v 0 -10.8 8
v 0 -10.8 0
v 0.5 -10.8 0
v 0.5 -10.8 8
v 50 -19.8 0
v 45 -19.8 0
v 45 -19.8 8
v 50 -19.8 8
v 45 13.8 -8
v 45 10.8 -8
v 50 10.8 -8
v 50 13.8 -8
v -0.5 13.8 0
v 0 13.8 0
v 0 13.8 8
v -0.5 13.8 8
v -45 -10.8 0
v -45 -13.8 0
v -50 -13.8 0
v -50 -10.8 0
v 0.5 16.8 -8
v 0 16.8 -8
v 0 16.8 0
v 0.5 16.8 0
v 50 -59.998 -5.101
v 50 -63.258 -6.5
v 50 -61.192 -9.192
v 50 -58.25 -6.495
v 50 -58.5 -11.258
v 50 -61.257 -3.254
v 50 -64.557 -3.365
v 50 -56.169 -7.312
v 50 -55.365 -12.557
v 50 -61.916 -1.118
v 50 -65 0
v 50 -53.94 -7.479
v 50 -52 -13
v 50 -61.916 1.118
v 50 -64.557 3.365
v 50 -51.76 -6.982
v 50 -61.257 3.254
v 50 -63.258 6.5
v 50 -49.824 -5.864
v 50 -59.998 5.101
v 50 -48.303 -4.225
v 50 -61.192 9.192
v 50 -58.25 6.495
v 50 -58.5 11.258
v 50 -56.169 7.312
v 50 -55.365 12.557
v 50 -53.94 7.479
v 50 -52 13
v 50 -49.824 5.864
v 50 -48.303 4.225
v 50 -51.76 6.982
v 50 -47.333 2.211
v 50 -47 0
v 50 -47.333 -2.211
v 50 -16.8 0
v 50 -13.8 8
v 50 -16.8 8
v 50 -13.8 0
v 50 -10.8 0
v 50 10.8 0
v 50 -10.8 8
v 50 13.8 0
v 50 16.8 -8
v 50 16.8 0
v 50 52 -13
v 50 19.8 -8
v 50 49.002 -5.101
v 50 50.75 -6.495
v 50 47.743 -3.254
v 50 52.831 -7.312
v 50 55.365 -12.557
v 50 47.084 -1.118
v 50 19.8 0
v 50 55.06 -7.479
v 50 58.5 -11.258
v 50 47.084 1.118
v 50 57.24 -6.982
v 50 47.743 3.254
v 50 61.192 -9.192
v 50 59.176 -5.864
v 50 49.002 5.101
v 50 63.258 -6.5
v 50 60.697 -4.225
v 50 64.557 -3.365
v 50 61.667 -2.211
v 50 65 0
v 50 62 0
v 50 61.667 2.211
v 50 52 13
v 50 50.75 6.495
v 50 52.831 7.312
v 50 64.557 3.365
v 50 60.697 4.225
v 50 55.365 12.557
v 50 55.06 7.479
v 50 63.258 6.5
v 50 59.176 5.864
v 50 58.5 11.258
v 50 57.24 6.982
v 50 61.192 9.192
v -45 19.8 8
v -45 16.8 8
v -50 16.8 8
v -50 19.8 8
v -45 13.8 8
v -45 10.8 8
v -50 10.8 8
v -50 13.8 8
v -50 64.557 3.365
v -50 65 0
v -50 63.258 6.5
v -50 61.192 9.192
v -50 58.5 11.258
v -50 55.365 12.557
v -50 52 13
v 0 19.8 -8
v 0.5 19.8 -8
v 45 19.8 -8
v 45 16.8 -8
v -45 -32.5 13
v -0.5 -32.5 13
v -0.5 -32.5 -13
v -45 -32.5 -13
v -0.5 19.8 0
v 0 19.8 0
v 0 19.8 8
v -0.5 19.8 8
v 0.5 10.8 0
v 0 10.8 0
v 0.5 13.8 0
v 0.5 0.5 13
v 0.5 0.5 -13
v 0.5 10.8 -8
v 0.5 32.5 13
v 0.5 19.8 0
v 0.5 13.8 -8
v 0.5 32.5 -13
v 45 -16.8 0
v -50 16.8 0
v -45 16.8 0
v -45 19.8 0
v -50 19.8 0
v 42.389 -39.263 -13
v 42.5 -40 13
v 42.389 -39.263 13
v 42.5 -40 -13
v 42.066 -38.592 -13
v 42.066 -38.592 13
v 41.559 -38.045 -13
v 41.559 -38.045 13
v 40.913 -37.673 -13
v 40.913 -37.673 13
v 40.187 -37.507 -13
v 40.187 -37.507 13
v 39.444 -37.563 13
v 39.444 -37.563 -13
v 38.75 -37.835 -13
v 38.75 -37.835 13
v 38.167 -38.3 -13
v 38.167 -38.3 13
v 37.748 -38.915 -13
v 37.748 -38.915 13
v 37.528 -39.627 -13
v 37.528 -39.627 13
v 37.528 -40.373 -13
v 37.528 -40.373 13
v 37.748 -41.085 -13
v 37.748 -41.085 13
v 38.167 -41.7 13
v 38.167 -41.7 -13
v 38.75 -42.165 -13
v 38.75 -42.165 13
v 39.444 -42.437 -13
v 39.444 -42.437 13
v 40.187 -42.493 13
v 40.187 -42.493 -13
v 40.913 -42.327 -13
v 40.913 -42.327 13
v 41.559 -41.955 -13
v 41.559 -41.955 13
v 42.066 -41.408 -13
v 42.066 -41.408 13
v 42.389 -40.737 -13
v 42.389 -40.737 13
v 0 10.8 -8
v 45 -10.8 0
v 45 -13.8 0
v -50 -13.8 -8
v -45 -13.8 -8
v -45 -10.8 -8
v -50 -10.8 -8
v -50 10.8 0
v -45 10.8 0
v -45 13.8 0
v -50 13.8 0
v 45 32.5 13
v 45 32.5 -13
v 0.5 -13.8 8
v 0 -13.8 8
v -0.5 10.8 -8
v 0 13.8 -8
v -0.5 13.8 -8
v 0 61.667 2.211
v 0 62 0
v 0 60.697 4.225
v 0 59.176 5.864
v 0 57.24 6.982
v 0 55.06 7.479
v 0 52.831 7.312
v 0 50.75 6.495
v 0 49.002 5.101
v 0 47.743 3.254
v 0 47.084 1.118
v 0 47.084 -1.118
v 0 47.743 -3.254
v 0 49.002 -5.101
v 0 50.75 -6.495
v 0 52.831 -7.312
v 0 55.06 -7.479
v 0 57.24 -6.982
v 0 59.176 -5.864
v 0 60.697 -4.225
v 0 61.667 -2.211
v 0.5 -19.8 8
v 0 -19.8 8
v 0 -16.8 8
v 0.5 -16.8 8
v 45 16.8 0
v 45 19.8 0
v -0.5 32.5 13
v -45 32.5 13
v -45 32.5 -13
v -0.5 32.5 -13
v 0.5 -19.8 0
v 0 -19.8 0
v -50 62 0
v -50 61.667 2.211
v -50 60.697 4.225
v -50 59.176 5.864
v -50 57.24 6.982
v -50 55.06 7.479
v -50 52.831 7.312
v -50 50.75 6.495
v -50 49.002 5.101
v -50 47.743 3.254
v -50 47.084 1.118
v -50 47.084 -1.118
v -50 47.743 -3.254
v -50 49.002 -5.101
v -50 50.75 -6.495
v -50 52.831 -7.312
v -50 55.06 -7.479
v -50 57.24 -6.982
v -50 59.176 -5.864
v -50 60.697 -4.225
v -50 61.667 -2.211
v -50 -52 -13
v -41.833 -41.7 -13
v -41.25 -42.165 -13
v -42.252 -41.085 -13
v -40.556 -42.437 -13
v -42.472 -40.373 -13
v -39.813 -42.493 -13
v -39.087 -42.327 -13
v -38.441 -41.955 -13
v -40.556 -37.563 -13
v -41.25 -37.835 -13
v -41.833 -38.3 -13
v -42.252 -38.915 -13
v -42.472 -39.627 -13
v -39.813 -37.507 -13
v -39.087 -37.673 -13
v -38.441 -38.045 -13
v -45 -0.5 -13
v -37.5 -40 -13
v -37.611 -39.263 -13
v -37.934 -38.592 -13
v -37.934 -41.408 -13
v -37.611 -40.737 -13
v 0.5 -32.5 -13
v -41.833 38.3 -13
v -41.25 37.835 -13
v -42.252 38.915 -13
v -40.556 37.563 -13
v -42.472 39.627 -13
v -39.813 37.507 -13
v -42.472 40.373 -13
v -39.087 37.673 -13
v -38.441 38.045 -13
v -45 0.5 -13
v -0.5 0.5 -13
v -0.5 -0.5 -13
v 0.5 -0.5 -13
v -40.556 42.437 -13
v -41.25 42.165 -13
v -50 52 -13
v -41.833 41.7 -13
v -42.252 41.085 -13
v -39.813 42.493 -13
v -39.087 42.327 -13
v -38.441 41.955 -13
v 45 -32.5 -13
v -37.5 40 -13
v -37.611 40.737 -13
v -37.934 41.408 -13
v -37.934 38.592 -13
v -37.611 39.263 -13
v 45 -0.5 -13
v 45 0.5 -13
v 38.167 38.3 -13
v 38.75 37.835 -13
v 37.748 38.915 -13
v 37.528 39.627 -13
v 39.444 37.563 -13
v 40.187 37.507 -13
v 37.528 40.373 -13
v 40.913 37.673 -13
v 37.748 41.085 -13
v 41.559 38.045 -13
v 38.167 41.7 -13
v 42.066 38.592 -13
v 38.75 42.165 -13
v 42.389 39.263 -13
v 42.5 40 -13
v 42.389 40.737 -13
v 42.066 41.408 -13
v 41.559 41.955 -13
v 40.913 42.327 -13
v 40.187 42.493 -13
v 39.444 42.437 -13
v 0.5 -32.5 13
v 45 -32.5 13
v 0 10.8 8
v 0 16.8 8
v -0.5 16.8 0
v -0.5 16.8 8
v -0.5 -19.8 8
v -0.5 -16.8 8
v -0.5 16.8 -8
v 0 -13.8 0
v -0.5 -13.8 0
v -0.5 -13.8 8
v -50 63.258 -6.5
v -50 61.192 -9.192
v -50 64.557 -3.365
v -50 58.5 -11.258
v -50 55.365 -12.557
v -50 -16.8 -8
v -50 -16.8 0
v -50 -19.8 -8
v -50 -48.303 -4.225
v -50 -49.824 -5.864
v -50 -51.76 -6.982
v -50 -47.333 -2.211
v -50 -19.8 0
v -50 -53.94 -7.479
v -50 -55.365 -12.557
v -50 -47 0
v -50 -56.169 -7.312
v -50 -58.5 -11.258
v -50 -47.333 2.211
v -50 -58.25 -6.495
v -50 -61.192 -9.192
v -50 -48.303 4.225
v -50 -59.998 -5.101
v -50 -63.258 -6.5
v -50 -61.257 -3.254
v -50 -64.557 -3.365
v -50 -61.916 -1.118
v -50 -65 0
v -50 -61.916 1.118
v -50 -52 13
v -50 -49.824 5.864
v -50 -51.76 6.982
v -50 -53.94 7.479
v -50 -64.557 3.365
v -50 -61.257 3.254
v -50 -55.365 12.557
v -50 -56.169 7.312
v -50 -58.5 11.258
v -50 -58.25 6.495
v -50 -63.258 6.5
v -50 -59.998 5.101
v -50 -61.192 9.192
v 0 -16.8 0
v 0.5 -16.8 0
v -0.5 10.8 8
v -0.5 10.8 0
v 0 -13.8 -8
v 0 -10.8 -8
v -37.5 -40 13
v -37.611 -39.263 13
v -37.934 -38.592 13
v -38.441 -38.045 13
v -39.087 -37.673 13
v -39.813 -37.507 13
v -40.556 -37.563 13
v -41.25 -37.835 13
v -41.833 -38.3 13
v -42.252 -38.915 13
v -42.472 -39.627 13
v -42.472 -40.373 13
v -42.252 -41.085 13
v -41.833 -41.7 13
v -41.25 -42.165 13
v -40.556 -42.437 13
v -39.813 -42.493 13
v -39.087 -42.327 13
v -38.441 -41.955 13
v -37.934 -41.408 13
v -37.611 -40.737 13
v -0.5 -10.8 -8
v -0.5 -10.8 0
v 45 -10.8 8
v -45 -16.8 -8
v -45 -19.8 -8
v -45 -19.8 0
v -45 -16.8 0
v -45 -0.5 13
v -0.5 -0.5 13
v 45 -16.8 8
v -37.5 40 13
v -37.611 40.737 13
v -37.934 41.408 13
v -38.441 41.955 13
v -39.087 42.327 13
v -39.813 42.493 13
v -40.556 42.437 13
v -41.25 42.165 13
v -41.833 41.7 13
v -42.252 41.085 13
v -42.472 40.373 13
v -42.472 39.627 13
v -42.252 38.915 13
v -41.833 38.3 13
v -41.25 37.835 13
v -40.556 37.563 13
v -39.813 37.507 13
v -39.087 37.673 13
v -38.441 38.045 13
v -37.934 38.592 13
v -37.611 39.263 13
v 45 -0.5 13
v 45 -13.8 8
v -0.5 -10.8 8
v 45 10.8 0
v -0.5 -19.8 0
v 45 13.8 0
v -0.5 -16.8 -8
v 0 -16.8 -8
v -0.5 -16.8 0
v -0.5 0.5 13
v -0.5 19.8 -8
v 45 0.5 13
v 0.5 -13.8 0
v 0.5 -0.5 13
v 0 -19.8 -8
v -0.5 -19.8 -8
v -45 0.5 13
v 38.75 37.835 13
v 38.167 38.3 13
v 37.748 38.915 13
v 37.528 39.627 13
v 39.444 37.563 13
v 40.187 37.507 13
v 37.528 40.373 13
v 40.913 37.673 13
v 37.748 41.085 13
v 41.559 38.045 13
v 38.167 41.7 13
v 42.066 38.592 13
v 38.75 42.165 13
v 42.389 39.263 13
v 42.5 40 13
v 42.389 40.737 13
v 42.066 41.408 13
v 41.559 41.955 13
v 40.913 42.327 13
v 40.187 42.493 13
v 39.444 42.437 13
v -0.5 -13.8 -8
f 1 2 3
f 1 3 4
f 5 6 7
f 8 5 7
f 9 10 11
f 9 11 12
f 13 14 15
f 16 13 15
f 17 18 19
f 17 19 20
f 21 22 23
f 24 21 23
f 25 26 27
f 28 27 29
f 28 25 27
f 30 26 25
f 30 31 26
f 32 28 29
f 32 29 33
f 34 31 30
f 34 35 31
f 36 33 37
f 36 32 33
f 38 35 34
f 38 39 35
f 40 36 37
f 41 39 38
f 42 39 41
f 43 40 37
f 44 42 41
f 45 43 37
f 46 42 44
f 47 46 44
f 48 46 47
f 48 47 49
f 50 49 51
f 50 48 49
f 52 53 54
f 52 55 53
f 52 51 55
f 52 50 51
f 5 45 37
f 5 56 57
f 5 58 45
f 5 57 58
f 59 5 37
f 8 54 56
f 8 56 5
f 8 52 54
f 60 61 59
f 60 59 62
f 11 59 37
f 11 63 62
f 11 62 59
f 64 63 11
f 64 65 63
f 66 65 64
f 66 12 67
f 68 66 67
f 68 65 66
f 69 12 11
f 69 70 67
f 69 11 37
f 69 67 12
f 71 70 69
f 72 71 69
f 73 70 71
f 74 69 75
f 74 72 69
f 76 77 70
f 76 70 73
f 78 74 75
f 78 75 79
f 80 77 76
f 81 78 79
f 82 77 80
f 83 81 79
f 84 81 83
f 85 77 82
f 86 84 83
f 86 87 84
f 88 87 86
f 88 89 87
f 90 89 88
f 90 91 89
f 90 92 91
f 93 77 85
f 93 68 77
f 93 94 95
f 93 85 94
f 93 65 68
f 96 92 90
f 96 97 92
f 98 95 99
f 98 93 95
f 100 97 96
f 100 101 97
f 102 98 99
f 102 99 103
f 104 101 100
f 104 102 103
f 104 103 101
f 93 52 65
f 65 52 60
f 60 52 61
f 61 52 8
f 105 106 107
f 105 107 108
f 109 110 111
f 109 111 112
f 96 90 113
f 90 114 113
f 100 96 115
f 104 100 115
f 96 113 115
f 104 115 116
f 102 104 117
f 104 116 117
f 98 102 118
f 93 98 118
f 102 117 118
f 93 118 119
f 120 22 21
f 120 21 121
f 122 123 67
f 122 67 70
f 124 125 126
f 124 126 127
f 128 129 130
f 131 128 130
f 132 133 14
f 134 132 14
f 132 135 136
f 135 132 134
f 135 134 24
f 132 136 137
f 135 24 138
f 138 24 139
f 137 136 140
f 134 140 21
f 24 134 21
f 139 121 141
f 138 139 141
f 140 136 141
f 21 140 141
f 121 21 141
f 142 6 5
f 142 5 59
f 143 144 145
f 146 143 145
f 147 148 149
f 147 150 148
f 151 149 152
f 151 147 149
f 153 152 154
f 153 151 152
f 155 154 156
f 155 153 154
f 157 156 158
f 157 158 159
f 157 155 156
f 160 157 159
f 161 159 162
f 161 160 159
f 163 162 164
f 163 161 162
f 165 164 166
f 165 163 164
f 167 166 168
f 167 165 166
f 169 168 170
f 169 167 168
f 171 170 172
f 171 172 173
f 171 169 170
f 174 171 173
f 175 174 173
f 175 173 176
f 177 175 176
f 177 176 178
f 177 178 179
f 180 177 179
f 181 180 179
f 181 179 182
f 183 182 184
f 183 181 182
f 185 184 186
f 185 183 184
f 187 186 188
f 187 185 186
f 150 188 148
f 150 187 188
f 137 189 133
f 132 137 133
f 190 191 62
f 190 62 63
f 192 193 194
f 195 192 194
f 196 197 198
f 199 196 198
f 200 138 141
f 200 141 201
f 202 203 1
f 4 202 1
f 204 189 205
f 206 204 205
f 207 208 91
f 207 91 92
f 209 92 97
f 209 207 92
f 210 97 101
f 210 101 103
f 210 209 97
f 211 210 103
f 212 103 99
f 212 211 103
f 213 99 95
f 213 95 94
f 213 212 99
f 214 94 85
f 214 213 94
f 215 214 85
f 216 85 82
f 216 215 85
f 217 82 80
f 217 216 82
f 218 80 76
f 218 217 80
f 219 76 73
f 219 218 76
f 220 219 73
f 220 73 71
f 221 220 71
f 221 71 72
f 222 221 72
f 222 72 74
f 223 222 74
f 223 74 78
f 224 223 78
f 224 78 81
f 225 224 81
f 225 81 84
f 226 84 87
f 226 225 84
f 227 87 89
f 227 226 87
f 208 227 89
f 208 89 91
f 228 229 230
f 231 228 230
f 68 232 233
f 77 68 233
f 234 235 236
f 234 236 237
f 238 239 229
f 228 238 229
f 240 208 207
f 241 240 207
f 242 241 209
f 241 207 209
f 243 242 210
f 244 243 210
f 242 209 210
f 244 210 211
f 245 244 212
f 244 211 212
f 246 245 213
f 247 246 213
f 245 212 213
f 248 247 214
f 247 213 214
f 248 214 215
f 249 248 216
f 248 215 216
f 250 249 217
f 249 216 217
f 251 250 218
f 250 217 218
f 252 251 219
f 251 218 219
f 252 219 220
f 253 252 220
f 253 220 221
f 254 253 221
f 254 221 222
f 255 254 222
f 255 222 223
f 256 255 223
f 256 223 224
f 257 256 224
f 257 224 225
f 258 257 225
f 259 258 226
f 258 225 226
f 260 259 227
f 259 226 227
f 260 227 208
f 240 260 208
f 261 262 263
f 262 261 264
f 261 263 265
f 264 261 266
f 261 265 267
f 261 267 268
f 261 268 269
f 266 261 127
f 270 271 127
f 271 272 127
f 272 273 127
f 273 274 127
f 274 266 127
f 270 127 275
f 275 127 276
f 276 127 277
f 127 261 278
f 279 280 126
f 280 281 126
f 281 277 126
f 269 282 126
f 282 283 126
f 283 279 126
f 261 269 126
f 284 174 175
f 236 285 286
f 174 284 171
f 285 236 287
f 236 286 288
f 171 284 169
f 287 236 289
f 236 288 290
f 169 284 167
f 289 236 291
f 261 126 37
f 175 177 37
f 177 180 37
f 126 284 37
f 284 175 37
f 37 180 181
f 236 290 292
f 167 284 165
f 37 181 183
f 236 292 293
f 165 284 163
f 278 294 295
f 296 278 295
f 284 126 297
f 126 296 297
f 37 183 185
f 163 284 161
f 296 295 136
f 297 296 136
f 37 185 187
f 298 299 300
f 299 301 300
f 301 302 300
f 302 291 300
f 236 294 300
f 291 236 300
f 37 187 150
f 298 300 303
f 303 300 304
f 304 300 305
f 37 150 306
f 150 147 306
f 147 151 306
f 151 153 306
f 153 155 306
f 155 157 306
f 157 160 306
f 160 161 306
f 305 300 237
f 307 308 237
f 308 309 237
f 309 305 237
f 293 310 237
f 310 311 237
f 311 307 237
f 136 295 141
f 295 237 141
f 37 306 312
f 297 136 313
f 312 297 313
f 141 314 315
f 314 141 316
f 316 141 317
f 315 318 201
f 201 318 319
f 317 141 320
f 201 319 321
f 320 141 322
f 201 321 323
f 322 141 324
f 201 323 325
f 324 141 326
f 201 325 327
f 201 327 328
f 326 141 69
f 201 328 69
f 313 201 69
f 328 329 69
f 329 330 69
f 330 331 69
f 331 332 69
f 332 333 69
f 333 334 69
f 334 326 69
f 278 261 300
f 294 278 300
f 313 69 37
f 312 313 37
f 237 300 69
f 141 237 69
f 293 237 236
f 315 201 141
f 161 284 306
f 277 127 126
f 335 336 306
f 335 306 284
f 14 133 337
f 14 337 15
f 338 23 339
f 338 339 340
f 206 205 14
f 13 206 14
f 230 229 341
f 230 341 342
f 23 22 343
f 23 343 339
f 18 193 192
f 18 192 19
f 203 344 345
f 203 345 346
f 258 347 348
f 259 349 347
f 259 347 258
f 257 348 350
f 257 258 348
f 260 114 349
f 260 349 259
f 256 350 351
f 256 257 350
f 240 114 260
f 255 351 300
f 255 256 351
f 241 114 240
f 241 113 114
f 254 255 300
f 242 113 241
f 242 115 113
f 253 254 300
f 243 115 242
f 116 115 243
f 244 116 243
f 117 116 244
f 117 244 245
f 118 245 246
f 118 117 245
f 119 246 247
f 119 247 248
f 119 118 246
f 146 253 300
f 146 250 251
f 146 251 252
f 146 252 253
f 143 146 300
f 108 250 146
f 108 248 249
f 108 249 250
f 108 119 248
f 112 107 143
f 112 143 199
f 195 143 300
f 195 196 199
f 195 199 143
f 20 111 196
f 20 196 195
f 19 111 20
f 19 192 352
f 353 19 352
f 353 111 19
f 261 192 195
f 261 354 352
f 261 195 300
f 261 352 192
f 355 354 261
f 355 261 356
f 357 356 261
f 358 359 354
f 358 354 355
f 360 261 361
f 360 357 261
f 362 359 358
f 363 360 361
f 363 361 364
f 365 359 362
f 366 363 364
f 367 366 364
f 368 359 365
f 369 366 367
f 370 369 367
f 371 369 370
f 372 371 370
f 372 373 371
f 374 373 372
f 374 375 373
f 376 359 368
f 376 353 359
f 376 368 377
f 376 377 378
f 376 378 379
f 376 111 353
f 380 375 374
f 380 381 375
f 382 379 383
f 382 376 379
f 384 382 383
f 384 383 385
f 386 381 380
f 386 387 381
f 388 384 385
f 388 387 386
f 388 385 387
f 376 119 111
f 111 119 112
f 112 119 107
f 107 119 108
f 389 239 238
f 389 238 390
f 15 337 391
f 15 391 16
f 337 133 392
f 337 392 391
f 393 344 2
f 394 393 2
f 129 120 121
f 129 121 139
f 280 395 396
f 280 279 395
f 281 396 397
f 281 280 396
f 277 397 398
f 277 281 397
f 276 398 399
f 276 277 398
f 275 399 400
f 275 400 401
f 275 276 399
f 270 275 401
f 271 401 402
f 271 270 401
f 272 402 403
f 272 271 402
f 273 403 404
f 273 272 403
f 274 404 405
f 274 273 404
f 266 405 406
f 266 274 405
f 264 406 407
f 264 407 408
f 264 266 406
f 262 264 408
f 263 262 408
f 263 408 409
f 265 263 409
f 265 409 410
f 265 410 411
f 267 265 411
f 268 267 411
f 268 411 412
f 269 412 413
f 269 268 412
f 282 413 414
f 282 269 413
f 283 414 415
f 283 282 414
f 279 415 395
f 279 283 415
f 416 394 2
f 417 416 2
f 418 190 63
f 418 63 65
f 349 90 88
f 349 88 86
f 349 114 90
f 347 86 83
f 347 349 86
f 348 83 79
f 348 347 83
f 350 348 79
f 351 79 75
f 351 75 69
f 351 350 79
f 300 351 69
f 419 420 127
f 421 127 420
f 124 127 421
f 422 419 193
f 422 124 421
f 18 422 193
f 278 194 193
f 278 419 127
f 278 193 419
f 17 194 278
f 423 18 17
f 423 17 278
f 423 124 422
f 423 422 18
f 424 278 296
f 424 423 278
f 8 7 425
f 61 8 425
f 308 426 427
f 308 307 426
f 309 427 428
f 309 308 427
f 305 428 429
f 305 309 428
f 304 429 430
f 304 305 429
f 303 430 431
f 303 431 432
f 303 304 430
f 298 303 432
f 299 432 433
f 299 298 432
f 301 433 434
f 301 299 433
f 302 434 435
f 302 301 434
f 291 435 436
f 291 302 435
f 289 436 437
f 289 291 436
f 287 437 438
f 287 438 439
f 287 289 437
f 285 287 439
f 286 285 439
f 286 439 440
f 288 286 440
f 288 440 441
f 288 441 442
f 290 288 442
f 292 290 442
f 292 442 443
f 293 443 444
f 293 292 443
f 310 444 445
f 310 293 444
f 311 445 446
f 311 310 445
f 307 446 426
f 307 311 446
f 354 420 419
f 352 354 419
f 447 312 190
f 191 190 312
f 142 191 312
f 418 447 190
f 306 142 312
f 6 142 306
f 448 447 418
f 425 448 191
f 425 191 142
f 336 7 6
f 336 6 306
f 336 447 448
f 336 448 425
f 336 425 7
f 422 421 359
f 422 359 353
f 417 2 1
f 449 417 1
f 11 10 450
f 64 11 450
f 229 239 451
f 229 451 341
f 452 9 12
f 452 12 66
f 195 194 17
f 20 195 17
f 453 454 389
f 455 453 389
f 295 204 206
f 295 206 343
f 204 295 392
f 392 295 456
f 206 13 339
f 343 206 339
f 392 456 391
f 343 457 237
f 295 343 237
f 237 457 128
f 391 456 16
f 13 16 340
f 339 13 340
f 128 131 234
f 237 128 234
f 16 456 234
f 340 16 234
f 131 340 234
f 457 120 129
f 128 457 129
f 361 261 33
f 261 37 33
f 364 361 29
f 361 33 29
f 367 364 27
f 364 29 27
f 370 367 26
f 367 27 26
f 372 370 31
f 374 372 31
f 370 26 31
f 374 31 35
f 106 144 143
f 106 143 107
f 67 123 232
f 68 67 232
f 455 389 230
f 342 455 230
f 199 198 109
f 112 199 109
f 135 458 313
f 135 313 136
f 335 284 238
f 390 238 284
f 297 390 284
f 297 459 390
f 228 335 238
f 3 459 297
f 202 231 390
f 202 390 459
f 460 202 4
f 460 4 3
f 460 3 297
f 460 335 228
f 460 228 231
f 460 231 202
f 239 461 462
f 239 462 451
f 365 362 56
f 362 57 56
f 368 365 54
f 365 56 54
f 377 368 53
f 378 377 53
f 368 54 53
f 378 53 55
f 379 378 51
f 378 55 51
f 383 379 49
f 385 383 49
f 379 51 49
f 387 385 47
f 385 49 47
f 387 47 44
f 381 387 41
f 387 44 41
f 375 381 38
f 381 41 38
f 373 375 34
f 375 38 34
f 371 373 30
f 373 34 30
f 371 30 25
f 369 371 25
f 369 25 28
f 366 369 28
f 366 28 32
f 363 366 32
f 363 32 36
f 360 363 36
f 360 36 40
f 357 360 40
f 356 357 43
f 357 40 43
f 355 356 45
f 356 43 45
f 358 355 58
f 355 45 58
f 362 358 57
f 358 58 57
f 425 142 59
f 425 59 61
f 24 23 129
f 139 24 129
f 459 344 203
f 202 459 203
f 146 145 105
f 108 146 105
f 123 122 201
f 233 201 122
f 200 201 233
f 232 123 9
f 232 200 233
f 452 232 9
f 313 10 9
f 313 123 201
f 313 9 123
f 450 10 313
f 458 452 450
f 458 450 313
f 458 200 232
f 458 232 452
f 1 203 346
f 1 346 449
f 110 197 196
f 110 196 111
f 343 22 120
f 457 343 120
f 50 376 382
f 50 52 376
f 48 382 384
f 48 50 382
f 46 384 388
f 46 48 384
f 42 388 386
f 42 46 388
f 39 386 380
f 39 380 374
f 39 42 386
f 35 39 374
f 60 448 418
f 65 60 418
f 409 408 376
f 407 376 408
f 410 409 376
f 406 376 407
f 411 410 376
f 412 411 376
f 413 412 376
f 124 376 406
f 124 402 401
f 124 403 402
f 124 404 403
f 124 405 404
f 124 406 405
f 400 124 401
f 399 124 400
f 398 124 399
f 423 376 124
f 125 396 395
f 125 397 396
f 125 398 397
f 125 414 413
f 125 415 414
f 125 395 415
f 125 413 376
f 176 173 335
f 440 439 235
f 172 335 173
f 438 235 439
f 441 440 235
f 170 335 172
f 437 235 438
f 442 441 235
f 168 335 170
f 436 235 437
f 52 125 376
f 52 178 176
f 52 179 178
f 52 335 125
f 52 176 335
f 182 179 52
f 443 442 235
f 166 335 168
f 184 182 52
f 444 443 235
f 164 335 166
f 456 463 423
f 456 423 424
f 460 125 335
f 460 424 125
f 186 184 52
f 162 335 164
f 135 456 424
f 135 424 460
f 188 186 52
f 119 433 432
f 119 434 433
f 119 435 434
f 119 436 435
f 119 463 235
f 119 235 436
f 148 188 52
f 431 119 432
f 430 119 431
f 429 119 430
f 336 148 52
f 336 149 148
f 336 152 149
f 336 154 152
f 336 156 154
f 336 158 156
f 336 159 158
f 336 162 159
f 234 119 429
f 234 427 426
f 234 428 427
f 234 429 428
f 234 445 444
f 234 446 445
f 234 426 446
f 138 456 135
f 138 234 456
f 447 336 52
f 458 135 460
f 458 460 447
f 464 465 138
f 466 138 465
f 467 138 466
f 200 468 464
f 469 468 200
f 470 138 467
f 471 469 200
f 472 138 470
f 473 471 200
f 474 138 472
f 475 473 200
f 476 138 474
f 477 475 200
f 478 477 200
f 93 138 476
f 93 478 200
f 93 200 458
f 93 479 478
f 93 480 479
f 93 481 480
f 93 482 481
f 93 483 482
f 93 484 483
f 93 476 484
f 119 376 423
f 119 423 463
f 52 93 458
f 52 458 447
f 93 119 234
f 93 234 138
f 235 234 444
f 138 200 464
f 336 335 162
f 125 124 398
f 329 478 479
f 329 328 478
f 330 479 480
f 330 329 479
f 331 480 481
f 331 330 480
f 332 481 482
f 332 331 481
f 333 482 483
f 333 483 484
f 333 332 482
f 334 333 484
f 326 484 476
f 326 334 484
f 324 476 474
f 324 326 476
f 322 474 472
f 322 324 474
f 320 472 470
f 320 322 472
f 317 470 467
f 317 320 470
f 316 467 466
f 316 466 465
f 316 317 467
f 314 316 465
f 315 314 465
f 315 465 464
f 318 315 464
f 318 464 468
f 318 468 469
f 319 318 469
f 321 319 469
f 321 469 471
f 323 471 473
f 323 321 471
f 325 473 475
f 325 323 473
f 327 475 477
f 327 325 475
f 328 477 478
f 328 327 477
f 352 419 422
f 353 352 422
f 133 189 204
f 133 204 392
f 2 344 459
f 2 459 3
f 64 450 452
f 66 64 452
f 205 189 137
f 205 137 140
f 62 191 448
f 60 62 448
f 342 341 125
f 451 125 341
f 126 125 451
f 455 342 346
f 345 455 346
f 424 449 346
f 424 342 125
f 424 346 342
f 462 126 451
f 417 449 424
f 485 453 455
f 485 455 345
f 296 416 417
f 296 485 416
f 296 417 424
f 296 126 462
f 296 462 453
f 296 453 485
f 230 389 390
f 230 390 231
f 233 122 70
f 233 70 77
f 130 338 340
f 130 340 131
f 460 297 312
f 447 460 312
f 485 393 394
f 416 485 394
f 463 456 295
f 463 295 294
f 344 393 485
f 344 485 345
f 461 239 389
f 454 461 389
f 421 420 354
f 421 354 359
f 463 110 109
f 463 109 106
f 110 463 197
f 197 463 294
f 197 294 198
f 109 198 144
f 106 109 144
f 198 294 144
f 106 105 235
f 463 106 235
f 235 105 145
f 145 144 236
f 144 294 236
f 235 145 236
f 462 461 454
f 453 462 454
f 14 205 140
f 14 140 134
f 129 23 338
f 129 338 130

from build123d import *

# Parameters (mm, degrees)
F0_R          = 2.5
F0_W          = 44.5
F0_H          = 1
F0_W_2        = 1
F0_H_2        = 32
F1_DEPTH      = 13
F2_R          = 7.5
F3_DEPTH      = 50
F4_R          = 12.99999
F2_W          = 3
F2_H          = 8
F5_DEPTH      = 50
F6_DEPTH      = 50
F6_DEPTH_BACK = 25


# Not quite as in the source:
# - a fillet or chamfer is up to 0.001 mm smaller than in the source, because OpenCascade refuses the exact size
# - a feature names something its author has since deleted; it is built from what else it names


with BuildPart() as f1:
    # F0 (on Top) → F1 (new body, symmetric)
    with BuildSketch(Plane.XY):
        Polygon((50, 45), (50, 65), (-40, 65), (-50, 65), (-50, -45), (-40, -45), (50, -45), (50, -34.6913893335), (50, 40), align=None)
        with Locations((-40, -40)):
            Circle(F0_R, mode=Mode.SUBTRACT)
        with Locations((40, -40)):
            Circle(F0_R, mode=Mode.SUBTRACT)
        with Locations((-40, 40)):
            Circle(F0_R, mode=Mode.SUBTRACT)
        Polygon((0.5, 32.5), (45, 32.5), (45, 0.5), (45, -0.5), (45, -32.5), (0.5, -32.5), (-0.5, -32.5), (-45, -32.5), (-45, -0.5), (-45, 0.5), (-45, 32.5), (-0.5, 32.5), align=None, mode=Mode.SUBTRACT)
        with Locations((40, 40)):
            Circle(F0_R, mode=Mode.SUBTRACT)
        Polygon((-40, -45), (-50, -45), (-50, -65), (50, -65), (50, -45), align=None)
        with Locations((22.75, 0)):
            Rectangle(F0_W, F0_H)
        with Locations((-22.75, 0)):
            Rectangle(F0_W, F0_H)
        Rectangle(F0_W_2, F0_H)
        with Locations((0, -16.5)):
            Rectangle(F0_W_2, F0_H_2)
        with Locations((0, 16.5)):
            Rectangle(F0_W_2, F0_H_2)
    extrude(amount=F1_DEPTH, both=True)

    # F2 (on Right) → F3 (cut, symmetric)
    with BuildSketch(Plane.YZ):
        with Locations((54.5, 0)):
            Circle(F2_R)
        with Locations((-54.5, 0)):
            Circle(F2_R)
    extrude(amount=F3_DEPTH, both=True, mode=Mode.SUBTRACT)

    # F4 (radius 13 in the source; OpenCascade refuses exactly that, so slightly less here)
    f4_edges = [f1.edges().sort_by_distance(p)[0] for p in [
        (0, 65, 13),
        (0, 65, -13),
        (0, -65, 13),
        (0, -65, -13),
    ]]
    fillet(f4_edges, radius=F4_R)

    # F2 (on Right) → F5 (cut)
    with BuildSketch(Plane.YZ):
        with Locations((-18.3, -4)):
            Rectangle(F2_W, F2_H)
        with Locations((-12.3, -4)):
            Rectangle(F2_W, F2_H)
        with Locations((12.3, 4)):
            Rectangle(F2_W, F2_H)
        with Locations((18.3, 4)):
            Rectangle(F2_W, F2_H)
    extrude(amount=-F5_DEPTH, mode=Mode.SUBTRACT)

    # F2 (on Right) → F6 (cut, two sides)
    with BuildSketch(Plane.YZ) as f6_sk:
        with Locations((12.3, -4)):
            Rectangle(F2_W, F2_H)
        with Locations((18.3, -4)):
            Rectangle(F2_W, F2_H)
        with Locations((-12.3, 4)):
            Rectangle(F2_W, F2_H)
        with Locations((-18.3, 4)):
            Rectangle(F2_W, F2_H)
    extrude(amount=F6_DEPTH, mode=Mode.SUBTRACT)
    extrude(f6_sk.sketch, amount=-F6_DEPTH_BACK, mode=Mode.SUBTRACT)


solid = f1.part
